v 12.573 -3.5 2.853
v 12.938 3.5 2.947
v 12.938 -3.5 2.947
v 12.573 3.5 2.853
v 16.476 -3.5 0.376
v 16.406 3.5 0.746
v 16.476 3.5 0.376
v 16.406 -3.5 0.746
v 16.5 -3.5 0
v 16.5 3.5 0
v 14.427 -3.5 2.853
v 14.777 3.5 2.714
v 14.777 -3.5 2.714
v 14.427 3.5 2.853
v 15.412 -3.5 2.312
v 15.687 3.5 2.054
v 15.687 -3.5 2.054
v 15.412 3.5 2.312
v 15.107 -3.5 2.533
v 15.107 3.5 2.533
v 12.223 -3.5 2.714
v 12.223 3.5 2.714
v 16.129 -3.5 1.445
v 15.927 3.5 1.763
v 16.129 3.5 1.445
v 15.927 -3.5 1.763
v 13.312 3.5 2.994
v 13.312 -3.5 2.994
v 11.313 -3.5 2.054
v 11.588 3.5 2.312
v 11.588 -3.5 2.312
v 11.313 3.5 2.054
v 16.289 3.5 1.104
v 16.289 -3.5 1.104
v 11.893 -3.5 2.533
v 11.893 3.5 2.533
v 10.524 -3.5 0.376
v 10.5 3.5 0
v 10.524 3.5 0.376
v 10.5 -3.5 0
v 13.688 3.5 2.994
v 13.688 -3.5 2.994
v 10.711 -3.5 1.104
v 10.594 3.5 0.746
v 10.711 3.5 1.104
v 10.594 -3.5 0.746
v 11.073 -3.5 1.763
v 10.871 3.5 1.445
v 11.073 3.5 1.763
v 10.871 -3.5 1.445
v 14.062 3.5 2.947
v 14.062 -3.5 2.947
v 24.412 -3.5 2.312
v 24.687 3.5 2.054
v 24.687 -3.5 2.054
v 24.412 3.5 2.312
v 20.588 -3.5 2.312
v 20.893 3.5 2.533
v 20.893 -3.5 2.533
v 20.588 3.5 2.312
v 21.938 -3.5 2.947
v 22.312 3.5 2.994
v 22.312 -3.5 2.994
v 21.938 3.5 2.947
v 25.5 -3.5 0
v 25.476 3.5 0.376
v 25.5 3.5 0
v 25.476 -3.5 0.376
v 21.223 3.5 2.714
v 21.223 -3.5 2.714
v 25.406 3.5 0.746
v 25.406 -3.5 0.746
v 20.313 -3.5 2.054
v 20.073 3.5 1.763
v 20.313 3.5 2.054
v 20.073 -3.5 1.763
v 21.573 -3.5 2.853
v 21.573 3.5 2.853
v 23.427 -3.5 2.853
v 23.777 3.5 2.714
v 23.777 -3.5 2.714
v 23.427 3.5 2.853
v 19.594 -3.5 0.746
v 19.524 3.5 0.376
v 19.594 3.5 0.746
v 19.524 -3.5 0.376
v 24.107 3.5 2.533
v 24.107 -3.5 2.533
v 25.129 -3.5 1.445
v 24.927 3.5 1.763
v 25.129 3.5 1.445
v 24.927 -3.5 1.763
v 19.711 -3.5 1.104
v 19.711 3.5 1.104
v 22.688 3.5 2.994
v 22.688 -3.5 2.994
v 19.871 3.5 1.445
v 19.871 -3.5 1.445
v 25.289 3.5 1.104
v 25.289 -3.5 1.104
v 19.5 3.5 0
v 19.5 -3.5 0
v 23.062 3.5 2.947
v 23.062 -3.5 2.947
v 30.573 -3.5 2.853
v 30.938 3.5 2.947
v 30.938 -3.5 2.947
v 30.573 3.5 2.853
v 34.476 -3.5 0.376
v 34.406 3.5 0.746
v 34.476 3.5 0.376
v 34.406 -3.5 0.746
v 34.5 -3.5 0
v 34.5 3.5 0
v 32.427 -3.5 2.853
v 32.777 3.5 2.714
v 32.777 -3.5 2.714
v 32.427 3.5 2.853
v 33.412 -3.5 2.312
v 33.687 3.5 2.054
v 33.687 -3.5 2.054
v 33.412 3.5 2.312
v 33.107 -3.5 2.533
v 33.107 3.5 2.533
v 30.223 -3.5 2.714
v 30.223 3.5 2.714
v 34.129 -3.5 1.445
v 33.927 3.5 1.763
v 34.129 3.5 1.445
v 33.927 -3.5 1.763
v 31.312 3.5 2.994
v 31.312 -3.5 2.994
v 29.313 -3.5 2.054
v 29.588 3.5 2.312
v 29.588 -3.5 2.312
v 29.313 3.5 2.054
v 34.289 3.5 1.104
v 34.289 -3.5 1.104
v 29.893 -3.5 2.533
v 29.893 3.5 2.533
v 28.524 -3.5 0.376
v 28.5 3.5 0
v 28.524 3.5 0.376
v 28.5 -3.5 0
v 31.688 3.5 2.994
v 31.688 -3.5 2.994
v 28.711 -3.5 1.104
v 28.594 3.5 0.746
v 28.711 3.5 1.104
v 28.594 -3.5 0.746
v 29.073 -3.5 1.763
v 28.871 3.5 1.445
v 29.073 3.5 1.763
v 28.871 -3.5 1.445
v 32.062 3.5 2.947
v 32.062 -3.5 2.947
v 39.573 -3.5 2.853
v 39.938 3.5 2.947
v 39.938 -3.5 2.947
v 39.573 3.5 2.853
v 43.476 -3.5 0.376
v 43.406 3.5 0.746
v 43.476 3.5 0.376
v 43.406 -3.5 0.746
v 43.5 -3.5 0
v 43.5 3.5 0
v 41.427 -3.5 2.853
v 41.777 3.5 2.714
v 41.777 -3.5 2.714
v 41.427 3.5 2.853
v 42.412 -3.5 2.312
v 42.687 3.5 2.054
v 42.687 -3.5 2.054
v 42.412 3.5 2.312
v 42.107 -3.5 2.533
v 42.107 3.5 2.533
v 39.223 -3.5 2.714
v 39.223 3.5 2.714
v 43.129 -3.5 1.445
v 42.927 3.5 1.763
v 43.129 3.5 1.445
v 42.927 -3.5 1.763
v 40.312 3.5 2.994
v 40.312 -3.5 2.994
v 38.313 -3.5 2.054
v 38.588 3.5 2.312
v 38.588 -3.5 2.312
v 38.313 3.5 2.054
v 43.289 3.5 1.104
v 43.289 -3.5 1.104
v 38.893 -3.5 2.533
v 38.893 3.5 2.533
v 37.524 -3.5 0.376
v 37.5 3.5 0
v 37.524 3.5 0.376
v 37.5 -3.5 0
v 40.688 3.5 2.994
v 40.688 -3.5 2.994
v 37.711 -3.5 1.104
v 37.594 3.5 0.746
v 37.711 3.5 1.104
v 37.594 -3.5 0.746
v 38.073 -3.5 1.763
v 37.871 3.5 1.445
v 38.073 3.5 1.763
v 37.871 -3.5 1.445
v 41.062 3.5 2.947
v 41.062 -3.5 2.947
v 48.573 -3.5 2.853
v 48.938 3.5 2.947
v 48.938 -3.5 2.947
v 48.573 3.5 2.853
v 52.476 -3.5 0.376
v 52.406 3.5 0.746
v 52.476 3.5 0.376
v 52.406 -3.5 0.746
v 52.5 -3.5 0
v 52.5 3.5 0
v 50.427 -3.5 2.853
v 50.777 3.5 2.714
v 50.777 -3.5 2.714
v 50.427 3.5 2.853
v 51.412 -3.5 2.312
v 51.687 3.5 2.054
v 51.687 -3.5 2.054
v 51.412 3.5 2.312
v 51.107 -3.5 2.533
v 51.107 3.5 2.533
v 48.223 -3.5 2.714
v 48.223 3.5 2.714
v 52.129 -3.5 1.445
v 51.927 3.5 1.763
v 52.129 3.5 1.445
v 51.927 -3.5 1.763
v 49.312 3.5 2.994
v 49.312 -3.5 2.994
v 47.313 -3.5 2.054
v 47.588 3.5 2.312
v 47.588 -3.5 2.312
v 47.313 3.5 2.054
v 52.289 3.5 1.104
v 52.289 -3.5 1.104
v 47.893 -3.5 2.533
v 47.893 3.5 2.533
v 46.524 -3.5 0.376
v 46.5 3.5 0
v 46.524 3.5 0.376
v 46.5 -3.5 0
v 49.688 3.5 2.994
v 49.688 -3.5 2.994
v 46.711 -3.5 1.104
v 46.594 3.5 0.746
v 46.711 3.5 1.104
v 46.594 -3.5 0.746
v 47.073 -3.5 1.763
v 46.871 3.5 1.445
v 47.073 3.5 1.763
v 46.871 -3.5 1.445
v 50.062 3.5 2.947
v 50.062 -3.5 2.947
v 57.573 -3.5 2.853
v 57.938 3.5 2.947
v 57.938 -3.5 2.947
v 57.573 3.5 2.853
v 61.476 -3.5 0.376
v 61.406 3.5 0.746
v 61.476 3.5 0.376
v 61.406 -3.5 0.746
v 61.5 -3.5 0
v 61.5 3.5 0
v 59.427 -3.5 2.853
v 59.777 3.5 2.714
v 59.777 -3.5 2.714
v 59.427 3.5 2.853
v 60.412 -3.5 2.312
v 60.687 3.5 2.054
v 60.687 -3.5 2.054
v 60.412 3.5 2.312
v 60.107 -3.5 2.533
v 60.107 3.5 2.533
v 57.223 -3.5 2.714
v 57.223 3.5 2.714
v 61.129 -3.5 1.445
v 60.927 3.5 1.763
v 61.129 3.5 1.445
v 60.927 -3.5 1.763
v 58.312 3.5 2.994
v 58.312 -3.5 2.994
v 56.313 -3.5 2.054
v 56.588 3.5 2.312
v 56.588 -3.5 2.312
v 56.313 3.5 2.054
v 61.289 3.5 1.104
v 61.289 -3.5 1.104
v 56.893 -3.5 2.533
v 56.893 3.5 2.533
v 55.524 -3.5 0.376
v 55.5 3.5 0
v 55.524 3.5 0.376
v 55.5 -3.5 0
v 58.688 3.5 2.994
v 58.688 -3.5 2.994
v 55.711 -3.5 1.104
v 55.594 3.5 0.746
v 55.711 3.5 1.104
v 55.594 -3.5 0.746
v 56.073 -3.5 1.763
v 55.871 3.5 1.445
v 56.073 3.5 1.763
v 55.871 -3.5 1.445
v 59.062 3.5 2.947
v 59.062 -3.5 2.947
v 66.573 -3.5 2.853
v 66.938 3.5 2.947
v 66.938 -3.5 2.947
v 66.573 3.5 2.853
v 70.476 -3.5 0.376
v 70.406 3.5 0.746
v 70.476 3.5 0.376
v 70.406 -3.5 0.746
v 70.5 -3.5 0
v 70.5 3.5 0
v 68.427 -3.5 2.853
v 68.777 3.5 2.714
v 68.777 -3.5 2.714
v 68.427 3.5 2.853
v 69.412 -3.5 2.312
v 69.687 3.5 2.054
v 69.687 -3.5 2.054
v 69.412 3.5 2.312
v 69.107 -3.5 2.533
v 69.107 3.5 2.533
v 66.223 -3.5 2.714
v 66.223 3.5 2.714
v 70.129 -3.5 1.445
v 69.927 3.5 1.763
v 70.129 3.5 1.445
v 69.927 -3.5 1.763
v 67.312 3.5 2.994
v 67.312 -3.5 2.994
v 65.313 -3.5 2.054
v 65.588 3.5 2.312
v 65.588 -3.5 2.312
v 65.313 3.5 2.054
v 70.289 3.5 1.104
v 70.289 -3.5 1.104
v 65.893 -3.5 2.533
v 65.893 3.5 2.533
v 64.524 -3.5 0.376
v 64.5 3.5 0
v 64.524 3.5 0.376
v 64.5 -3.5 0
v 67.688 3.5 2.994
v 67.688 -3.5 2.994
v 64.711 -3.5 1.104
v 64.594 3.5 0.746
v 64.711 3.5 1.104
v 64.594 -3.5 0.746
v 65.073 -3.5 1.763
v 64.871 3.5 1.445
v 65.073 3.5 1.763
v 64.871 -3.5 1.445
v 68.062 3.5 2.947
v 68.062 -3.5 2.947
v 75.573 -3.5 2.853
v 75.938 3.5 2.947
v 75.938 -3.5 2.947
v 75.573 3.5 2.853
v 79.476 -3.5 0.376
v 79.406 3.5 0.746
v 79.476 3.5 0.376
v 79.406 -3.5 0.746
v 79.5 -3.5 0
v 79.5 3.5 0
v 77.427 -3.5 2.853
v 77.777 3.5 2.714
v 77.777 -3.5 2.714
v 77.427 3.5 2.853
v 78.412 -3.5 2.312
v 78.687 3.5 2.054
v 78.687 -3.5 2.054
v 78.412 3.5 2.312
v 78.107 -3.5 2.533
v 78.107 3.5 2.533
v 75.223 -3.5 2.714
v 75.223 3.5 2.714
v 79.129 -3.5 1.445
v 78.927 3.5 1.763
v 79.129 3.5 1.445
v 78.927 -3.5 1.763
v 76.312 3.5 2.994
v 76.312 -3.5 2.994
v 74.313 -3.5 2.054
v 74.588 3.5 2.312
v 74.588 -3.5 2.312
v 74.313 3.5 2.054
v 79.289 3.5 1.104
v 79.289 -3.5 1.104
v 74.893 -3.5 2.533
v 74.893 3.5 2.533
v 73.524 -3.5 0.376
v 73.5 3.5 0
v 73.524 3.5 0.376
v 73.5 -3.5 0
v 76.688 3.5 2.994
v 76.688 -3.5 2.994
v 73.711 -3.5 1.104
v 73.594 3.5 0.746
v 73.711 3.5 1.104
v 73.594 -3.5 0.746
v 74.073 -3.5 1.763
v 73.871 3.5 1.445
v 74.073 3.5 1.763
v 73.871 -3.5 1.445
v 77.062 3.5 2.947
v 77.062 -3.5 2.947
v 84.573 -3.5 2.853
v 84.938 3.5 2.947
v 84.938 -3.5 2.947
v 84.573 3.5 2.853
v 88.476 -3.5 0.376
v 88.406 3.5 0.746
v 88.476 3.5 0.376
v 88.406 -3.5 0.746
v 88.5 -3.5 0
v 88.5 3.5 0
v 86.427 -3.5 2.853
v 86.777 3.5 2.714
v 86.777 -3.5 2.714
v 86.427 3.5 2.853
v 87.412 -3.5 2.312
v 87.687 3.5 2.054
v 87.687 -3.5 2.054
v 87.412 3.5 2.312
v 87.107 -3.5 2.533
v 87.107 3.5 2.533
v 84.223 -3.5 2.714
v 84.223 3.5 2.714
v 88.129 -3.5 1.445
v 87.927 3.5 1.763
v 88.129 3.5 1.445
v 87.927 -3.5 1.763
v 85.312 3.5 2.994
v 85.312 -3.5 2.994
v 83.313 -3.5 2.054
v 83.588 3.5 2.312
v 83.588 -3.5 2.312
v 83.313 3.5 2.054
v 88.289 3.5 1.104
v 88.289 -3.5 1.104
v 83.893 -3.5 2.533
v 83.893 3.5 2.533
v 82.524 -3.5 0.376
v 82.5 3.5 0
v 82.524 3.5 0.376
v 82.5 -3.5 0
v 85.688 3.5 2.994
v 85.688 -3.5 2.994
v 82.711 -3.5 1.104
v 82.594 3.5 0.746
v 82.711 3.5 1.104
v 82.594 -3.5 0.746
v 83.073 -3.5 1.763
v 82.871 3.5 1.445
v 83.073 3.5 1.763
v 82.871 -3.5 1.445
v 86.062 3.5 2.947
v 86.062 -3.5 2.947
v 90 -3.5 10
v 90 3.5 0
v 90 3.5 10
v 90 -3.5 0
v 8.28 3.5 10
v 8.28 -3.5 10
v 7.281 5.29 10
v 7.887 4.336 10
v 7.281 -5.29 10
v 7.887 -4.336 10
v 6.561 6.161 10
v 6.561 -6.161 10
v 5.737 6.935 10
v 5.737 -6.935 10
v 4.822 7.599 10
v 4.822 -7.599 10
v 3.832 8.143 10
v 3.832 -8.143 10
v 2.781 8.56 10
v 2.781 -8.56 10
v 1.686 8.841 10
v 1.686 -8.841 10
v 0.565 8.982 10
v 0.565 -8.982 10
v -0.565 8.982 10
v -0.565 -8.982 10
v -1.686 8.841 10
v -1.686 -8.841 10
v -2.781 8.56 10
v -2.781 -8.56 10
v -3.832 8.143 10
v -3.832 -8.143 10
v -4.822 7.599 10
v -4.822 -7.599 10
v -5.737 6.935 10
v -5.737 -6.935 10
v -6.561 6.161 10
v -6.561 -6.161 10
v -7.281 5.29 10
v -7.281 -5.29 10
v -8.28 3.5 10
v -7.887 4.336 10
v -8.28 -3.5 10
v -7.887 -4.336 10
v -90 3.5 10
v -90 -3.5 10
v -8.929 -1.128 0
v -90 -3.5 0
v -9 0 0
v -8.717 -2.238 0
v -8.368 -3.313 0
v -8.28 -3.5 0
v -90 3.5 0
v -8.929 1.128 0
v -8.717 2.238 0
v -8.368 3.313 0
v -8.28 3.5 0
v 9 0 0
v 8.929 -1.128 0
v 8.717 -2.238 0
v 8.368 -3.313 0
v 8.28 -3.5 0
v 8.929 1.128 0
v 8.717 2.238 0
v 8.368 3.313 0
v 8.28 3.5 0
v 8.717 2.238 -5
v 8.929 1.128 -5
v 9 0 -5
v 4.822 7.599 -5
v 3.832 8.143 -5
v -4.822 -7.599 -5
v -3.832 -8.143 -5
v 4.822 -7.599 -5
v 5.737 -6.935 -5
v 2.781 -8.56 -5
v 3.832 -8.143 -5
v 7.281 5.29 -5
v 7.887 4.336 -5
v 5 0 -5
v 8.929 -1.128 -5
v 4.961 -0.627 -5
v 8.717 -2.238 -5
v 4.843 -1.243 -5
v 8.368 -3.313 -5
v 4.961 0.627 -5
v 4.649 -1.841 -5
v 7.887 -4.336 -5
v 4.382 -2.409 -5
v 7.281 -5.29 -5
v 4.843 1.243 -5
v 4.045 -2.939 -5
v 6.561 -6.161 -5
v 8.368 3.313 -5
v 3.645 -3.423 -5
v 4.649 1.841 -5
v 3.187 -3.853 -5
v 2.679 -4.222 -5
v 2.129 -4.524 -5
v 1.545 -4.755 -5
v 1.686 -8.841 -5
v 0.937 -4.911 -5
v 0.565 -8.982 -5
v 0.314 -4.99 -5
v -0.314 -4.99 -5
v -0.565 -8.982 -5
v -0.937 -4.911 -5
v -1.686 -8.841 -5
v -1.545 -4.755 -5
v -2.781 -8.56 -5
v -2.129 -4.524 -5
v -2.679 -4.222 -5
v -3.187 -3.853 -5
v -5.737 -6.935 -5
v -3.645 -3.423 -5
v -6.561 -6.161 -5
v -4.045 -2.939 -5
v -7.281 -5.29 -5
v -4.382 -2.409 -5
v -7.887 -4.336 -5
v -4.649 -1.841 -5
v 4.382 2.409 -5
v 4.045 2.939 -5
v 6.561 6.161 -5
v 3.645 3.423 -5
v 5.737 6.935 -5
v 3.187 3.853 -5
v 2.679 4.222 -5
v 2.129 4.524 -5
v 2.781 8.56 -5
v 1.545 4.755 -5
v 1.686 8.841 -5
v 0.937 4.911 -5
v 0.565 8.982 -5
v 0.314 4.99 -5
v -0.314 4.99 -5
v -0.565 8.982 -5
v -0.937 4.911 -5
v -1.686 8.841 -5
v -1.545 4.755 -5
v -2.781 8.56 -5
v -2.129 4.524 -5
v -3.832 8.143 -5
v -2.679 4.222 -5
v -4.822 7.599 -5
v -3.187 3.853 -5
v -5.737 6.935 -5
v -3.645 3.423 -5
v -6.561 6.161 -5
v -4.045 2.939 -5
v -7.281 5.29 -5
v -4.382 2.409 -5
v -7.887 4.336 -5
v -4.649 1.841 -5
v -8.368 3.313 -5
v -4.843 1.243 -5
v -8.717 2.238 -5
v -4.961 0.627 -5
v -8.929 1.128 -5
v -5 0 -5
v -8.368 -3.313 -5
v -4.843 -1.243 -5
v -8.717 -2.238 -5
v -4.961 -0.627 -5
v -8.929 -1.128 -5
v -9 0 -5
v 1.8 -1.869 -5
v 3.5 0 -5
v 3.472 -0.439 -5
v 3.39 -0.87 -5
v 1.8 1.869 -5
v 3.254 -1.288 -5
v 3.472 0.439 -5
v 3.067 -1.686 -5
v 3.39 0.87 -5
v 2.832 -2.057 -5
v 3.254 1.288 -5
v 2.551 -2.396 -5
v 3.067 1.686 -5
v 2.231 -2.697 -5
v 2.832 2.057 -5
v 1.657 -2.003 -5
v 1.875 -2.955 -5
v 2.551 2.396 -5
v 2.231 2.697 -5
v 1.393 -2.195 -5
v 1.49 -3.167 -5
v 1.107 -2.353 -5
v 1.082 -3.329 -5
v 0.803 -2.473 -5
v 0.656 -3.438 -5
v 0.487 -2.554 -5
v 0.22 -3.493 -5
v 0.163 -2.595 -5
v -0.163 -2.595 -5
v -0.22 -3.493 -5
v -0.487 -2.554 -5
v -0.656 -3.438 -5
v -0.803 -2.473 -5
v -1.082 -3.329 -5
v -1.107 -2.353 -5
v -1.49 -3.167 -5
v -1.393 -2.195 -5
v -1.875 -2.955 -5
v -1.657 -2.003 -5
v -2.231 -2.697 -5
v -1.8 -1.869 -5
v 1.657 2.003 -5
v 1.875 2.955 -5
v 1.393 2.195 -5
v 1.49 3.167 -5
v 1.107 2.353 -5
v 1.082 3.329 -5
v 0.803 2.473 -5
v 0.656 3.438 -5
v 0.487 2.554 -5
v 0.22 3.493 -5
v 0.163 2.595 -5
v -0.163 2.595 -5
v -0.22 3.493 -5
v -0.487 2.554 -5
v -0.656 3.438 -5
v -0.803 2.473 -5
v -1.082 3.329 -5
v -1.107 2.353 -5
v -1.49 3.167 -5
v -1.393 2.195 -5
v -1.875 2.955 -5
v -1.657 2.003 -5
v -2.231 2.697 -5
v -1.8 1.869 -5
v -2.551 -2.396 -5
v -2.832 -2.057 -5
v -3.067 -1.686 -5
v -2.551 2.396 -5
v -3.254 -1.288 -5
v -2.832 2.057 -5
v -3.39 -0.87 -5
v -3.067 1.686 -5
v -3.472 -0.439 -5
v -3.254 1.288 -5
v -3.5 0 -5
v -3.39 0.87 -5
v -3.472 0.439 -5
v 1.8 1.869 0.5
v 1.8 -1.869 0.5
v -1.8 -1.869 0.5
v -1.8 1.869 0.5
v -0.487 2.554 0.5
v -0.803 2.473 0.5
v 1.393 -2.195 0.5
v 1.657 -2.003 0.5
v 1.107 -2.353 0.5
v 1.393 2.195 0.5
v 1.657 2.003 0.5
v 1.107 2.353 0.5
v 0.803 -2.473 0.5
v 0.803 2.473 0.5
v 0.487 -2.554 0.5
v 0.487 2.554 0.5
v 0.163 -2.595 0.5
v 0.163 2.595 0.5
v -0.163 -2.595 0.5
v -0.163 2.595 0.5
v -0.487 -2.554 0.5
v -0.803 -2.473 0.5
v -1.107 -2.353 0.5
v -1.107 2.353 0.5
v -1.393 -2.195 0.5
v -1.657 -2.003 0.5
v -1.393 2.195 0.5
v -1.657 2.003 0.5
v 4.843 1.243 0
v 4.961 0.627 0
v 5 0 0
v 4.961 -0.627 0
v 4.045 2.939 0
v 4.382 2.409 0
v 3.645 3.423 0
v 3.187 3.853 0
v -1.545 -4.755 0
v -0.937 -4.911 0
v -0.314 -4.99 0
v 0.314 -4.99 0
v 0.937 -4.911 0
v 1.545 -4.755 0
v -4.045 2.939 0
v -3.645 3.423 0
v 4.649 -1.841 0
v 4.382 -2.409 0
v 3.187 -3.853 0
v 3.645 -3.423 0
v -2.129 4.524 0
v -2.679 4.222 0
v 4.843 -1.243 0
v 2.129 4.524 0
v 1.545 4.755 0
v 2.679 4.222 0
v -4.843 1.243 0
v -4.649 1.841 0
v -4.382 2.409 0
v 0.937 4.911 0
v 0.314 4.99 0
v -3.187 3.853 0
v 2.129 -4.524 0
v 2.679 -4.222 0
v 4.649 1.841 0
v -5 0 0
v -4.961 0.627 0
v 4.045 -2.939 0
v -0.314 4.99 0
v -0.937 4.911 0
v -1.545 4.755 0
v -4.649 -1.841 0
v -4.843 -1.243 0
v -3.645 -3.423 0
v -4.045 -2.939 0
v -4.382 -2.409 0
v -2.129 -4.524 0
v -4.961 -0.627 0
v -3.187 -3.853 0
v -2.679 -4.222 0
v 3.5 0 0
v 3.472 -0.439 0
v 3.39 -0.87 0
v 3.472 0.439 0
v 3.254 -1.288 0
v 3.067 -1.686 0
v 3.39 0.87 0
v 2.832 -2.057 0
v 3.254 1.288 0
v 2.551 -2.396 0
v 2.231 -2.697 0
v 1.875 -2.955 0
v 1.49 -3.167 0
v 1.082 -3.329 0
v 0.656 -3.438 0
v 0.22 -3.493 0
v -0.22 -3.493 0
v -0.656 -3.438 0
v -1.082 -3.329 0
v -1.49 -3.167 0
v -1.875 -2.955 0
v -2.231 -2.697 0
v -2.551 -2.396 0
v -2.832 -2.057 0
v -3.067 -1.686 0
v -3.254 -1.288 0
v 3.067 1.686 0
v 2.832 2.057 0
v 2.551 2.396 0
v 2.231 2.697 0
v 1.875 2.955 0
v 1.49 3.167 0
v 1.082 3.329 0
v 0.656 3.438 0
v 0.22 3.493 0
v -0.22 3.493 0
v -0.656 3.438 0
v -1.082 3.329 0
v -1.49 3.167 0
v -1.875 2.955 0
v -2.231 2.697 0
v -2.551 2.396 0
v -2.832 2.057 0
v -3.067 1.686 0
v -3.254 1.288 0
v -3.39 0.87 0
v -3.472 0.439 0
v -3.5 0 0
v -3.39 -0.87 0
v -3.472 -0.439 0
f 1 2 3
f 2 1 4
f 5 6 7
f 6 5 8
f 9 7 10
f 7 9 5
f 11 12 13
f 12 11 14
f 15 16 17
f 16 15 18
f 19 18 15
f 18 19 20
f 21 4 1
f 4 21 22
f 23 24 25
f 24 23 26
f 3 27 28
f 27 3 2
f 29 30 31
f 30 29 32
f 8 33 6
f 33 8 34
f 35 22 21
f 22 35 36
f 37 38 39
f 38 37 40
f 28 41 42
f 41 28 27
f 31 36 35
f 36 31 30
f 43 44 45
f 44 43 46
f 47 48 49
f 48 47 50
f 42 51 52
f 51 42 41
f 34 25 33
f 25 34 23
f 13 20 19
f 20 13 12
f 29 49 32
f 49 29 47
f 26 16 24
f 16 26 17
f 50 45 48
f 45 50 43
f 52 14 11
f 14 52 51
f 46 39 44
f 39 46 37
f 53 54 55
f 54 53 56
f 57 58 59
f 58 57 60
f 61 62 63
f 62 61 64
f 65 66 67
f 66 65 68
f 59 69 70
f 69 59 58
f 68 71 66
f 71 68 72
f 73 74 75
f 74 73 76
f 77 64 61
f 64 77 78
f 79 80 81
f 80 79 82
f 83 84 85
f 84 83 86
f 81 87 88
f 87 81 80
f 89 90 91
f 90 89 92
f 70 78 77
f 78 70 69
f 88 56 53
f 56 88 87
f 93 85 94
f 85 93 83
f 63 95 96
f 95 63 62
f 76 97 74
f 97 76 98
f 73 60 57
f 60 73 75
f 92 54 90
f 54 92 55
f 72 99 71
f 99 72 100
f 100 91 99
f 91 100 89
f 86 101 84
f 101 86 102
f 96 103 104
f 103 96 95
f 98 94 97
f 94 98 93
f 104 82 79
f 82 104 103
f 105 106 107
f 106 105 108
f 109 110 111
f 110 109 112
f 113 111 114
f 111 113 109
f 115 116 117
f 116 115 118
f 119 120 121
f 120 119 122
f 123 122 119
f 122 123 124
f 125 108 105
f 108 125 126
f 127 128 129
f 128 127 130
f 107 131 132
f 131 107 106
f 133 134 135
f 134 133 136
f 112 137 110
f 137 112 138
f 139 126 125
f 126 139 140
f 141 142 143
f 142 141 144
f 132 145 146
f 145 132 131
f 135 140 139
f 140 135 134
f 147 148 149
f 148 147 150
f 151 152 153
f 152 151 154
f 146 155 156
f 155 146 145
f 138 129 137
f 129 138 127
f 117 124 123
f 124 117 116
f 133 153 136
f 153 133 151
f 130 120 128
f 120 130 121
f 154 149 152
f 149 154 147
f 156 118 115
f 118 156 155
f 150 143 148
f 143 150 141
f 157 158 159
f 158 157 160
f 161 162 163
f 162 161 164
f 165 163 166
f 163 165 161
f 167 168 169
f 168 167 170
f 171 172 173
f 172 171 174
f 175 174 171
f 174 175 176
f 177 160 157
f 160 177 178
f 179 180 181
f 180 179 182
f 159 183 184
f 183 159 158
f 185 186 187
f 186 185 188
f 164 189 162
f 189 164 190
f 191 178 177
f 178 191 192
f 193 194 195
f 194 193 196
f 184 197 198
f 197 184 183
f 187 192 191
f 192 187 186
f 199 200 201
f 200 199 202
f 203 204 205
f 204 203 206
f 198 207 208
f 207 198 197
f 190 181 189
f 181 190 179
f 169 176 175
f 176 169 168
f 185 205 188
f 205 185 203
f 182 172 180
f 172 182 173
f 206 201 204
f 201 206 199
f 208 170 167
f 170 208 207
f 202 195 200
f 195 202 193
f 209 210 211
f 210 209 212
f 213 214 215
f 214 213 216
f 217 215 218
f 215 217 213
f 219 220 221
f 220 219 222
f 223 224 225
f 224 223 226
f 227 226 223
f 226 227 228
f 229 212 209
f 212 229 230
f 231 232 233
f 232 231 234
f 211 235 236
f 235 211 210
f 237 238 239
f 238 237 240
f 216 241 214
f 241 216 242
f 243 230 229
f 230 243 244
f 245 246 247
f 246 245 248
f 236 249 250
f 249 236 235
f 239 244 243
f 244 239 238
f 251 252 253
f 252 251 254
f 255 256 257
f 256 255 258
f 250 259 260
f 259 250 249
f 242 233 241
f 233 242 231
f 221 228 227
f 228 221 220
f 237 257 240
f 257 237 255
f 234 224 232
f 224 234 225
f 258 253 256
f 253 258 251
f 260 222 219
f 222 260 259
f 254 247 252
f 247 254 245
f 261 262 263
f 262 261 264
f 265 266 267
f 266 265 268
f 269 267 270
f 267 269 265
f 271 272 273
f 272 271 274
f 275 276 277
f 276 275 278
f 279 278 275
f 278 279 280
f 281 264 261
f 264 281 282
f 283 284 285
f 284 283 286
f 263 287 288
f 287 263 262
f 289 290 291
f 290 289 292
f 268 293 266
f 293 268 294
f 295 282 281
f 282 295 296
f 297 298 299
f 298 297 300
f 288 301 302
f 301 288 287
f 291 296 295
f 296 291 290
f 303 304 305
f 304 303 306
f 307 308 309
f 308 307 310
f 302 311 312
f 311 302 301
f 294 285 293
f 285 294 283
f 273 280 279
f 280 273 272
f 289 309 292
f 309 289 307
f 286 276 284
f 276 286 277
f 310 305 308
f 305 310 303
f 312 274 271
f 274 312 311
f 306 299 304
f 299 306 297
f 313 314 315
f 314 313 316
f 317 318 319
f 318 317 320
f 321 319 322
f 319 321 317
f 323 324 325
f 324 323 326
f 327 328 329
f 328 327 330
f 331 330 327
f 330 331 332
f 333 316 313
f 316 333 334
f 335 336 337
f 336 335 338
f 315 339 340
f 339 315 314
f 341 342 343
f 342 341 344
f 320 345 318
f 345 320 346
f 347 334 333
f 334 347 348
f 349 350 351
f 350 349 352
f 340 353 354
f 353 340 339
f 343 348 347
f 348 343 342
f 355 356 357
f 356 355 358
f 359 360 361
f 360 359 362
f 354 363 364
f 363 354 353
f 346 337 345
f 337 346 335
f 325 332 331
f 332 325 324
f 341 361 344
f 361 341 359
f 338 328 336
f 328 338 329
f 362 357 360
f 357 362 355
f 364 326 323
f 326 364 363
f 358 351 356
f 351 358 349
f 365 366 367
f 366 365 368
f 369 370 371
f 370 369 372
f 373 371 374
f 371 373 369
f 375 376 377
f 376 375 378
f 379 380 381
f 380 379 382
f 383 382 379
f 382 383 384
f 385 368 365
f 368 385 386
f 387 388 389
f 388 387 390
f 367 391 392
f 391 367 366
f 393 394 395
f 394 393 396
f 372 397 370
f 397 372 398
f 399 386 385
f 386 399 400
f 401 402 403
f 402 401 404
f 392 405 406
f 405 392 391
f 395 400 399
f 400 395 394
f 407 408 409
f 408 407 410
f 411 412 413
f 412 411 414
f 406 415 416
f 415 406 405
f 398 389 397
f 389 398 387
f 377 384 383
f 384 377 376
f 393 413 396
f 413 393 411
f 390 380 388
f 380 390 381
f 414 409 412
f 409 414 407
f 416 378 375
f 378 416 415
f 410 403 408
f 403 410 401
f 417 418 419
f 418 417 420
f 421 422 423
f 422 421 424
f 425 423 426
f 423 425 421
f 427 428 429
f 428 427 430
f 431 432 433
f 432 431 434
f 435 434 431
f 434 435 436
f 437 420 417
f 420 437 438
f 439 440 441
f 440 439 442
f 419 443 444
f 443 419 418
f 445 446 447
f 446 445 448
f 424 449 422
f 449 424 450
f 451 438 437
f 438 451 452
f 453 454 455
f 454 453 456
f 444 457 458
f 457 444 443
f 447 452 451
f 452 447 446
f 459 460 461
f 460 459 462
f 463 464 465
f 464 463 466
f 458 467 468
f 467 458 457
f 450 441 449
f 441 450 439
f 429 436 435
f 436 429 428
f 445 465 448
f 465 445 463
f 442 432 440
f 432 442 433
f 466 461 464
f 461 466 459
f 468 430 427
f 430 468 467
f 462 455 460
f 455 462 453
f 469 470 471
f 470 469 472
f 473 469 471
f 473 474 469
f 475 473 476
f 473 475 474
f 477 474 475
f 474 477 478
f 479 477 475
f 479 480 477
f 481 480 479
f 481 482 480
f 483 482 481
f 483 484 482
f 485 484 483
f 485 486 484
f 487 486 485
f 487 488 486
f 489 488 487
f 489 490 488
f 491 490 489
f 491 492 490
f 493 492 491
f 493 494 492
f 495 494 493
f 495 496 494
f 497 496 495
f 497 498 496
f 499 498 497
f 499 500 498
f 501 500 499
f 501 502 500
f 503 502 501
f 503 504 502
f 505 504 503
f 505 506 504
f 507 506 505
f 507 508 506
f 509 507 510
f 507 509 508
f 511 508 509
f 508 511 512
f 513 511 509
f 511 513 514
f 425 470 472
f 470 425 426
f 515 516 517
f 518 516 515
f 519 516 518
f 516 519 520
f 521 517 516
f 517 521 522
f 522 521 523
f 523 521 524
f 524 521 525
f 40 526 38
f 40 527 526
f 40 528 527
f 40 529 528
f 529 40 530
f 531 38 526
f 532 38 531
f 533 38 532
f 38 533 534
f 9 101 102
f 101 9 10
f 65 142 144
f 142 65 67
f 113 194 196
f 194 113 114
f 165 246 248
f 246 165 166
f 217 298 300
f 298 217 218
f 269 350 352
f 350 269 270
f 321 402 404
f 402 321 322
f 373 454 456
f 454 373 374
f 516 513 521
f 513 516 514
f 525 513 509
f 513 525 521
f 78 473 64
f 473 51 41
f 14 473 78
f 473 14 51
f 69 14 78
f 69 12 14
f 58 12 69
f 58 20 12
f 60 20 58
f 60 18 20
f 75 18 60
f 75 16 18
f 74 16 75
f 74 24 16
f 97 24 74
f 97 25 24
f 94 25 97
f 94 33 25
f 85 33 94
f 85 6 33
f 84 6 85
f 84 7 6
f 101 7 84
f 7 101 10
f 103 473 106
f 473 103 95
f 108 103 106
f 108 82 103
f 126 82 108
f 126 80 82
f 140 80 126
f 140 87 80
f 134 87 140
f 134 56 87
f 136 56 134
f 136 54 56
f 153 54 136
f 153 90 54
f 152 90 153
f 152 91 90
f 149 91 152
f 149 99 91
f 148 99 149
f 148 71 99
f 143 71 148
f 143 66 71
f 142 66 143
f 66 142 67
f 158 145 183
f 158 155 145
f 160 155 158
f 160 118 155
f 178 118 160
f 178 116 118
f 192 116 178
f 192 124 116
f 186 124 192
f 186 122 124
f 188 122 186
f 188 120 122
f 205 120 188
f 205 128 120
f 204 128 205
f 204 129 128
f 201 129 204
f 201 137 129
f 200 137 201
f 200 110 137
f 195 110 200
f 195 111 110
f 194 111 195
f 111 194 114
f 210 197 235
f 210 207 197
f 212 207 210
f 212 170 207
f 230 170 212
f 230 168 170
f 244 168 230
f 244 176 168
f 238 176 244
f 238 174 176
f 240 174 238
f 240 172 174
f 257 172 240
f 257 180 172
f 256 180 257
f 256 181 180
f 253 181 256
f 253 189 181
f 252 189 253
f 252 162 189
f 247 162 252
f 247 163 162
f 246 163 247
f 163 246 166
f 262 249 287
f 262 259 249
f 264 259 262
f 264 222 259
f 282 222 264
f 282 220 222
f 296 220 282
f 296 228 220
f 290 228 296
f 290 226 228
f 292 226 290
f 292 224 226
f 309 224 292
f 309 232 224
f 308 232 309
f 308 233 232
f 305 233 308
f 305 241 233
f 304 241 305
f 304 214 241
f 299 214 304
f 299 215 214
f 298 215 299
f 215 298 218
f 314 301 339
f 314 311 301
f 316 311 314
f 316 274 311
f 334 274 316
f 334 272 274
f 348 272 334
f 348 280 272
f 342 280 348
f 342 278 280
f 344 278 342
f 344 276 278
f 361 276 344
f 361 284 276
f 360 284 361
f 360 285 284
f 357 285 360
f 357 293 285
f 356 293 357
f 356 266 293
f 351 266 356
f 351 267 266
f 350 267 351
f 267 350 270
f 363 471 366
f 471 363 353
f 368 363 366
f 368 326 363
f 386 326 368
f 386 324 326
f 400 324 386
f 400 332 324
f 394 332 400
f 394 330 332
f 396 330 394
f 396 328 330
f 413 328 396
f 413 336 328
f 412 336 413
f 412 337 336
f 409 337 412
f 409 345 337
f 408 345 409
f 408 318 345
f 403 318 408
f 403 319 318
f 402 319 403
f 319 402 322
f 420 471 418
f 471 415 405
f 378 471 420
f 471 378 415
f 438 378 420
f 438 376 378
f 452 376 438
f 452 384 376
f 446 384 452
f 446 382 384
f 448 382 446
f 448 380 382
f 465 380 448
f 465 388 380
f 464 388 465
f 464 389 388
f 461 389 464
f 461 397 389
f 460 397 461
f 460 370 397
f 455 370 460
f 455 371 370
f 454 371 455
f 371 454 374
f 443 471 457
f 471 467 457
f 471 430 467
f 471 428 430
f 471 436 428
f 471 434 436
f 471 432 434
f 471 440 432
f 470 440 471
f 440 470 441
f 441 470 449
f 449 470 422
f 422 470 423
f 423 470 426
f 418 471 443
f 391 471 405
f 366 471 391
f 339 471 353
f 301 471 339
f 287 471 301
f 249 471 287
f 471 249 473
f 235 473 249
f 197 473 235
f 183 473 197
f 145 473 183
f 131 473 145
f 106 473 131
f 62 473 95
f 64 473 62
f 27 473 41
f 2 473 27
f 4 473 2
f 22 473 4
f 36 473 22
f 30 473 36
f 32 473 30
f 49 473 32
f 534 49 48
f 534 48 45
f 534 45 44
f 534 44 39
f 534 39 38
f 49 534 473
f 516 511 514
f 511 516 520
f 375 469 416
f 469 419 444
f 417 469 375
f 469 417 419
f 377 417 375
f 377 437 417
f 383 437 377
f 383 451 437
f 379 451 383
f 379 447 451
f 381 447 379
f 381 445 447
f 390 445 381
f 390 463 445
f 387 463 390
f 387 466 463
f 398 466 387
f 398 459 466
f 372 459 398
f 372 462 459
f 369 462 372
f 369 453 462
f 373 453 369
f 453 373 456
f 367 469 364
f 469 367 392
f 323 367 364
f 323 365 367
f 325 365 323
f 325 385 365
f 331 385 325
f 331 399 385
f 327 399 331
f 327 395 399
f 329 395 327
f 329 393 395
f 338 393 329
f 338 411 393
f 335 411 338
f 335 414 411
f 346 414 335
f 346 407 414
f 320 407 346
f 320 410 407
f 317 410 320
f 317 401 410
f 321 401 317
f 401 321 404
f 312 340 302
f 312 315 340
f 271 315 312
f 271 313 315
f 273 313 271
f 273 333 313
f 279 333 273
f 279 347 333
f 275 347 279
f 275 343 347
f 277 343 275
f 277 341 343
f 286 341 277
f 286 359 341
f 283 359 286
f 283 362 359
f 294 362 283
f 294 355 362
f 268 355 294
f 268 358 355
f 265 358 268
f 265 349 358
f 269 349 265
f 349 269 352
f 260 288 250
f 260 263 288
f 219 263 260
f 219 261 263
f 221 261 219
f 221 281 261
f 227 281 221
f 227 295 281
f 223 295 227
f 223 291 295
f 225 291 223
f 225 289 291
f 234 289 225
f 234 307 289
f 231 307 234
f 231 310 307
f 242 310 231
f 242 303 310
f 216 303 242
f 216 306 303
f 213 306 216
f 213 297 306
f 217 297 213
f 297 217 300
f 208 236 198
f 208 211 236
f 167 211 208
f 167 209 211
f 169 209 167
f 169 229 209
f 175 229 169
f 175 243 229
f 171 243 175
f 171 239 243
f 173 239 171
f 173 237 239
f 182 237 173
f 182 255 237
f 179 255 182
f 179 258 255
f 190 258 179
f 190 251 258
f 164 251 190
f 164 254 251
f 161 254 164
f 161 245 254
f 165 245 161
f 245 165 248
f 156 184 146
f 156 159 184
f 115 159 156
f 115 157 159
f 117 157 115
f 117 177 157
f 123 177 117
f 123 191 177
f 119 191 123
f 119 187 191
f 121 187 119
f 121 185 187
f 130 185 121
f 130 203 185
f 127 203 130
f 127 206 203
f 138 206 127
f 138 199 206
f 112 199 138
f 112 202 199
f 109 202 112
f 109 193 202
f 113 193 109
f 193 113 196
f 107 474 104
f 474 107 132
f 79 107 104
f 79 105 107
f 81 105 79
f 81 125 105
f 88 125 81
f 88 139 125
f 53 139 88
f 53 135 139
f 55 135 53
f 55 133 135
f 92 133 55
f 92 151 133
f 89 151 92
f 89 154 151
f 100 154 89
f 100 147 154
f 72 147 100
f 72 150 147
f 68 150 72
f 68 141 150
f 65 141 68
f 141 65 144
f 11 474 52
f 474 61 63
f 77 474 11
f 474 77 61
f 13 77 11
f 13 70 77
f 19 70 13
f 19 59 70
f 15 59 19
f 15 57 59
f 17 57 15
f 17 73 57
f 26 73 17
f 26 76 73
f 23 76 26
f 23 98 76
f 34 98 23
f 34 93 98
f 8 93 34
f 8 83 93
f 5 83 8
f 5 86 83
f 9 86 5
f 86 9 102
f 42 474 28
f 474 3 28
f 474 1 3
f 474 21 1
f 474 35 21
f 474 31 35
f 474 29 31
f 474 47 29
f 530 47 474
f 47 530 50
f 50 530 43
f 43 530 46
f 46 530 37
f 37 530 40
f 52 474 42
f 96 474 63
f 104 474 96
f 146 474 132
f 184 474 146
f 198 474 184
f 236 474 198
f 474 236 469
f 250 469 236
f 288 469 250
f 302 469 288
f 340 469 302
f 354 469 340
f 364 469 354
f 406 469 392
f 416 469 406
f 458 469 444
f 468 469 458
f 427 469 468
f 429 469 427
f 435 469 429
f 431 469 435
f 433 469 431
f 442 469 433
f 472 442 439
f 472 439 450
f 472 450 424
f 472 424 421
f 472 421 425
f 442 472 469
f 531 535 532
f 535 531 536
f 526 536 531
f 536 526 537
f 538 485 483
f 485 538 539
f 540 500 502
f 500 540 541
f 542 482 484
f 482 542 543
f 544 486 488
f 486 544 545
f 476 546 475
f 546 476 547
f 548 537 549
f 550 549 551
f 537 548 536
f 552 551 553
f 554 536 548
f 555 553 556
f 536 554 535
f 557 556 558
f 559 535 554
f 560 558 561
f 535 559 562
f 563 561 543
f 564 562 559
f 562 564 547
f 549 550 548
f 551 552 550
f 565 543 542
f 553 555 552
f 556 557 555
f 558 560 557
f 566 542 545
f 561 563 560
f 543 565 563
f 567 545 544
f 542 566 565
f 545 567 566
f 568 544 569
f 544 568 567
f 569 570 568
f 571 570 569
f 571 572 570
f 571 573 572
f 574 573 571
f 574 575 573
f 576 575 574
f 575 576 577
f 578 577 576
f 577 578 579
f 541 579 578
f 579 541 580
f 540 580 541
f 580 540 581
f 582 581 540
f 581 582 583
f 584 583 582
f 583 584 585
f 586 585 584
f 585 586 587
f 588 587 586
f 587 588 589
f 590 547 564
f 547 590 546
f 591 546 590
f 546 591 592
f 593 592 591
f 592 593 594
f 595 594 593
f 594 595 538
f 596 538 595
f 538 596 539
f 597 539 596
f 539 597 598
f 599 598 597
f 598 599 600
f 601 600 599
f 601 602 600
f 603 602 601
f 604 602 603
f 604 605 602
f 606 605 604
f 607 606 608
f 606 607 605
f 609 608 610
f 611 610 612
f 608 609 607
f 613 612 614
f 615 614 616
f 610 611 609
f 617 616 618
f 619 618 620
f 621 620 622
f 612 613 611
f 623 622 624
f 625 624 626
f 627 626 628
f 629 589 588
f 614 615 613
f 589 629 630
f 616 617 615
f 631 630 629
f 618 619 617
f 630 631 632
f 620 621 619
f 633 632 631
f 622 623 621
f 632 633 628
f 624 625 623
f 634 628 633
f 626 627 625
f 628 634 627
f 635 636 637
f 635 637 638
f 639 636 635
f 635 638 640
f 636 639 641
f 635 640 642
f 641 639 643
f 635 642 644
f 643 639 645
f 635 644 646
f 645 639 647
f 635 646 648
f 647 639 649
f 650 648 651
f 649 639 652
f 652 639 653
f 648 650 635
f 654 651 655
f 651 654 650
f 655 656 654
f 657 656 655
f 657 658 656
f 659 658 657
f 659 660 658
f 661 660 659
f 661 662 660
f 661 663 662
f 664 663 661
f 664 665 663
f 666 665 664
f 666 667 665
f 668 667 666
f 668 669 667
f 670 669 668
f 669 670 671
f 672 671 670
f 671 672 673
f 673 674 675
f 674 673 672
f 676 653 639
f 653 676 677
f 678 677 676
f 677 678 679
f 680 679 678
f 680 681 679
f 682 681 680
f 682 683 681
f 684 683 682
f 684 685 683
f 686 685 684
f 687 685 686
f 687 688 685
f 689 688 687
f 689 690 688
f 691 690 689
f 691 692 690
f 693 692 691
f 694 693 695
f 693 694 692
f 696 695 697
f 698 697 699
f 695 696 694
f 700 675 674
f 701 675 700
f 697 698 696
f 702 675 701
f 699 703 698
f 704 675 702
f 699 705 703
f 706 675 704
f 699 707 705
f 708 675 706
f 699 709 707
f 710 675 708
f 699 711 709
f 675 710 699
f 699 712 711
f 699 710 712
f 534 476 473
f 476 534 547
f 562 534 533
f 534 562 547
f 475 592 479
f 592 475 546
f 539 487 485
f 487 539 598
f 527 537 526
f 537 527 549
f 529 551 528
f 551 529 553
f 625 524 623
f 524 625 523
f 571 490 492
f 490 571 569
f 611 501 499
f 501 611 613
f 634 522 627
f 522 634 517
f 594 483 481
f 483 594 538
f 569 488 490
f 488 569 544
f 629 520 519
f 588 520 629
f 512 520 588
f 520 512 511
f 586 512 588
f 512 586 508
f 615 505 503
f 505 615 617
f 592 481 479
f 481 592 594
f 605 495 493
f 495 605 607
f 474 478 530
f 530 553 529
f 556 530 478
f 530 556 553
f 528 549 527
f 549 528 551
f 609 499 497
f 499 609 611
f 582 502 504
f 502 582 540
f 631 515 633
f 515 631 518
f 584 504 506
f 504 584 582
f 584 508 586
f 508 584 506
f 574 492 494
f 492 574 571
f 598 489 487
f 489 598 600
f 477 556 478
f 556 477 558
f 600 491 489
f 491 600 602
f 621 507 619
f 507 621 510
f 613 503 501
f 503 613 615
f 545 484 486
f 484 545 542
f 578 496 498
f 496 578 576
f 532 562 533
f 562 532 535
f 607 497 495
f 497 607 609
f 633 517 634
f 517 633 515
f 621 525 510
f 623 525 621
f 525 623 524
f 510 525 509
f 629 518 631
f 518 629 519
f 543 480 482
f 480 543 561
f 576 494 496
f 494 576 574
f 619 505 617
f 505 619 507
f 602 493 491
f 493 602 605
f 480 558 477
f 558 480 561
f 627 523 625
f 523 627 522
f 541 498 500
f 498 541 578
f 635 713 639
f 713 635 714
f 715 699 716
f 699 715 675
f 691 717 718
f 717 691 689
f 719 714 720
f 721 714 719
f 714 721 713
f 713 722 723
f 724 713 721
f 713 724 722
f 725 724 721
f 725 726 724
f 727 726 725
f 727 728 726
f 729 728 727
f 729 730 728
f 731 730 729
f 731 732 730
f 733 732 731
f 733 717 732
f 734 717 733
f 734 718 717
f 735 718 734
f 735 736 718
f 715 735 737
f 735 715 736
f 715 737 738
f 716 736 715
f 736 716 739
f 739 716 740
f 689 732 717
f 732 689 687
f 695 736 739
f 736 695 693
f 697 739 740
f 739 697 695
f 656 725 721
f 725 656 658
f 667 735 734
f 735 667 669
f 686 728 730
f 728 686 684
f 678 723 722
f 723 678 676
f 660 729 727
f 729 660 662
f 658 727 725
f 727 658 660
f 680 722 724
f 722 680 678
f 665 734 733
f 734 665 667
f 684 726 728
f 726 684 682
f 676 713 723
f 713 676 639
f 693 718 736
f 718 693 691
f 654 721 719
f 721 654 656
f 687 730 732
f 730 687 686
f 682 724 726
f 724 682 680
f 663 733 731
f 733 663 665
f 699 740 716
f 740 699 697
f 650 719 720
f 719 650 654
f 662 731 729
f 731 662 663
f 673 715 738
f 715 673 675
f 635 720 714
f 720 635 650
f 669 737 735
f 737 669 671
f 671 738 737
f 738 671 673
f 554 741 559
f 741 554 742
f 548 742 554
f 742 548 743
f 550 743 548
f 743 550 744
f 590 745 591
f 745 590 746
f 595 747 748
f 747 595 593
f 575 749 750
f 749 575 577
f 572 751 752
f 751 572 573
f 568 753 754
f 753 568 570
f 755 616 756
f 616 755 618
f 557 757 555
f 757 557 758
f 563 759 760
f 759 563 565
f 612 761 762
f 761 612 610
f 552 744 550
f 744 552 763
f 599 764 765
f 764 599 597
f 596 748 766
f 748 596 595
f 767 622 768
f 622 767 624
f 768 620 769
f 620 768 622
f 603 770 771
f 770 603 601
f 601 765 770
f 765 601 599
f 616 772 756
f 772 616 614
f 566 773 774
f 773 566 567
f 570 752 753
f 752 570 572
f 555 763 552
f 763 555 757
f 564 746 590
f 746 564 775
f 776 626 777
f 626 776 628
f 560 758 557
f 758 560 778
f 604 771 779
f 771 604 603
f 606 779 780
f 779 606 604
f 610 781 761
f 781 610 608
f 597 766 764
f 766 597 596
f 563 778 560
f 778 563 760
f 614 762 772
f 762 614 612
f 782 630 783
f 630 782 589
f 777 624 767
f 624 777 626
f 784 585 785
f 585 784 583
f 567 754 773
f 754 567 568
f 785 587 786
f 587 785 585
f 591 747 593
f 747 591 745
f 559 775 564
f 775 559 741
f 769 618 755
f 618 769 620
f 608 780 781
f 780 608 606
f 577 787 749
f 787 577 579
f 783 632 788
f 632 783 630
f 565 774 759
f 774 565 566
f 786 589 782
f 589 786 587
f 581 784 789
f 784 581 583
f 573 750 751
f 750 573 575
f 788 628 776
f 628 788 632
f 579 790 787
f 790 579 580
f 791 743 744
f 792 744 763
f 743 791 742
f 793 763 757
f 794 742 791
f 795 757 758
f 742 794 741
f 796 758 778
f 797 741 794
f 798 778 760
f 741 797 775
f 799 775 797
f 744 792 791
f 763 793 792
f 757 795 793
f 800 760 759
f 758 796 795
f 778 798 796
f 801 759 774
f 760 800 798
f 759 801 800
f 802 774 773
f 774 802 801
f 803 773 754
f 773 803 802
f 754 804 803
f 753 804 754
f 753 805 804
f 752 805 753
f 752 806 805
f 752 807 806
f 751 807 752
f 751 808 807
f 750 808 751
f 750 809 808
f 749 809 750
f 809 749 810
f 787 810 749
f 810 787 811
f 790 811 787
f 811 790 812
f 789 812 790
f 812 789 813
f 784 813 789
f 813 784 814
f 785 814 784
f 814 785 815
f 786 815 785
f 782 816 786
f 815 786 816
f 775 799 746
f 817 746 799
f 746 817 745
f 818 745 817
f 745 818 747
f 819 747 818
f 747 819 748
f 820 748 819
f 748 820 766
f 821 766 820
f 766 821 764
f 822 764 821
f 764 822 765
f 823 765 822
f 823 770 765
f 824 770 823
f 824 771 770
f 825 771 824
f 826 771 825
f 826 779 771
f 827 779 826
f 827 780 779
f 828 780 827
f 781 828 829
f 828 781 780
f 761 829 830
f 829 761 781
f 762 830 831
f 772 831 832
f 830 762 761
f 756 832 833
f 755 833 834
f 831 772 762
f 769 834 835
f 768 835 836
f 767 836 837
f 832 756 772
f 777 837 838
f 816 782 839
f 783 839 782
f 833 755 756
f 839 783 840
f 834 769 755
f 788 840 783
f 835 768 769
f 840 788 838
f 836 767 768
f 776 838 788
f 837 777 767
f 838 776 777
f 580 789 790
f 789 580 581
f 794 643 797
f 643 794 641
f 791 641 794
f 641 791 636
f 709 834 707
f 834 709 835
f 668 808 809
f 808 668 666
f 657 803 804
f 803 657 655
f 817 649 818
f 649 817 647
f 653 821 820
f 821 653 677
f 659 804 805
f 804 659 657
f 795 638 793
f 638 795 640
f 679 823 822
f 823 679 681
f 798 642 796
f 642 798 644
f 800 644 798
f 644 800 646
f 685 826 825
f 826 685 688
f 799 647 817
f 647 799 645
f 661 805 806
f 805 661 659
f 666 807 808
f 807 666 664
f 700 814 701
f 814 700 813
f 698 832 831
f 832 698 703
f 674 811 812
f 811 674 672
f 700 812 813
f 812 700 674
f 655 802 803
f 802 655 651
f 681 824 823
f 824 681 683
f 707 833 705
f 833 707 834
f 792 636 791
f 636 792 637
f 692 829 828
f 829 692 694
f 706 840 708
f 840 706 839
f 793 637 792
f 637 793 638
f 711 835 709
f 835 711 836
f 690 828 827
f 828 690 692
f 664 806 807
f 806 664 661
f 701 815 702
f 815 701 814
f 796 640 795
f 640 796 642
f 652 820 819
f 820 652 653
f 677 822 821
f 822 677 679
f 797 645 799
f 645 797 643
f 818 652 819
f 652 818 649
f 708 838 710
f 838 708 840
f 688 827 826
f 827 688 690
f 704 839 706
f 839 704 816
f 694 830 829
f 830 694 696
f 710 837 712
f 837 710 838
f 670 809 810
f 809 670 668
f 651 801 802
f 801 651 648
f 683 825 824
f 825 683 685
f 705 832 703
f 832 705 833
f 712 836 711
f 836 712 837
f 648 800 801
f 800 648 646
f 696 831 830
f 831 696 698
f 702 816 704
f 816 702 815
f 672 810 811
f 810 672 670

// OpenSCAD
//Main plate geometry
main_base_thickness = 5;
main_base_r = 90;

//Main ring geometry
main_ring_outer_r = 100;
main_ring_inner_r = 95;
main_ring_h = 60;
ring_clearance = 10;

//Motor hole properties
axel_to_screw_centerline_dist = 8;
screwhole_to_screwhole_dist = 35;
axel_plug_r = 4.75;
axel_base_r = 5/2;
axel_tip_w = 3;


//Arm geometry
arm_length = 2*main_ring_inner_r - ring_clearance;
arm_width = 7;
arm_height = 10;
groove_r = 3;
//The actual number of grooves is this +1
n_grooves = 10;

arm_h_offset = 1.49;


//Axel geometry
axel_r = 5/2;
axel_w = 3.6;
axel_h = 8;
axel_small_h = 0;

//Connector geometry
connector_r = 9;
connector_h = 15;

difference(){
    union(){
        //Grooved arm
        difference(){
            //Main arm
            difference(){
                translate([-arm_length/2, -arm_width/2, 0]){
                    
                    cube([arm_length, arm_width, arm_height]);
                }   
 //               translate([-arm_length/2,-arm_width/2,-10+arm_h_offset]){
 //                   cube([arm_length/2,arm_width,10]);
 //               }
            }
            //Grooves
            translate([arm_length/(4*n_grooves), arm_width, 0]){
                for (i = [1:n_grooves]){
                    translate([i*arm_length/(2*n_grooves), 0, 0,]){
                        rotate([90, 0, 0]) cylinder(h=2*arm_width, r=groove_r, $fn=50);  
                    }
                }
            }
              
        }
        
        //Connector
        translate([0,0,-connector_h+10]){
            cylinder(h=connector_h, r=connector_r, $fn=50);
        }

    }
    
    //Connector hole
//    translate([0,0,-connector_h/2]){
//        %cylinder(h=axel_small_h, r=axel_r, $fn=50);
//    }
    
    translate([0,0,-connector_h/2]){
        intersection(){
            cube([axel_w, 20,20],center=true);
            cylinder(h=axel_h, r=axel_r+0.1, $fn=50);
        }
    }
    
    translate([0,0,-10]){
        difference(){
            cylinder(r=5,h=10,$fn=50);
            cylinder(r=3.5,h=10, $fn=50);
        }
    }
}

//    translate([0,-arm_width/2, arm_height]){
//       
//        rotate([-90,0,90]){
//            linear_extrude(height=arm_length/2, scale = [1,0.7]){
//                square(size=[arm_width, arm_height]);
//            }
//        }
//    }
